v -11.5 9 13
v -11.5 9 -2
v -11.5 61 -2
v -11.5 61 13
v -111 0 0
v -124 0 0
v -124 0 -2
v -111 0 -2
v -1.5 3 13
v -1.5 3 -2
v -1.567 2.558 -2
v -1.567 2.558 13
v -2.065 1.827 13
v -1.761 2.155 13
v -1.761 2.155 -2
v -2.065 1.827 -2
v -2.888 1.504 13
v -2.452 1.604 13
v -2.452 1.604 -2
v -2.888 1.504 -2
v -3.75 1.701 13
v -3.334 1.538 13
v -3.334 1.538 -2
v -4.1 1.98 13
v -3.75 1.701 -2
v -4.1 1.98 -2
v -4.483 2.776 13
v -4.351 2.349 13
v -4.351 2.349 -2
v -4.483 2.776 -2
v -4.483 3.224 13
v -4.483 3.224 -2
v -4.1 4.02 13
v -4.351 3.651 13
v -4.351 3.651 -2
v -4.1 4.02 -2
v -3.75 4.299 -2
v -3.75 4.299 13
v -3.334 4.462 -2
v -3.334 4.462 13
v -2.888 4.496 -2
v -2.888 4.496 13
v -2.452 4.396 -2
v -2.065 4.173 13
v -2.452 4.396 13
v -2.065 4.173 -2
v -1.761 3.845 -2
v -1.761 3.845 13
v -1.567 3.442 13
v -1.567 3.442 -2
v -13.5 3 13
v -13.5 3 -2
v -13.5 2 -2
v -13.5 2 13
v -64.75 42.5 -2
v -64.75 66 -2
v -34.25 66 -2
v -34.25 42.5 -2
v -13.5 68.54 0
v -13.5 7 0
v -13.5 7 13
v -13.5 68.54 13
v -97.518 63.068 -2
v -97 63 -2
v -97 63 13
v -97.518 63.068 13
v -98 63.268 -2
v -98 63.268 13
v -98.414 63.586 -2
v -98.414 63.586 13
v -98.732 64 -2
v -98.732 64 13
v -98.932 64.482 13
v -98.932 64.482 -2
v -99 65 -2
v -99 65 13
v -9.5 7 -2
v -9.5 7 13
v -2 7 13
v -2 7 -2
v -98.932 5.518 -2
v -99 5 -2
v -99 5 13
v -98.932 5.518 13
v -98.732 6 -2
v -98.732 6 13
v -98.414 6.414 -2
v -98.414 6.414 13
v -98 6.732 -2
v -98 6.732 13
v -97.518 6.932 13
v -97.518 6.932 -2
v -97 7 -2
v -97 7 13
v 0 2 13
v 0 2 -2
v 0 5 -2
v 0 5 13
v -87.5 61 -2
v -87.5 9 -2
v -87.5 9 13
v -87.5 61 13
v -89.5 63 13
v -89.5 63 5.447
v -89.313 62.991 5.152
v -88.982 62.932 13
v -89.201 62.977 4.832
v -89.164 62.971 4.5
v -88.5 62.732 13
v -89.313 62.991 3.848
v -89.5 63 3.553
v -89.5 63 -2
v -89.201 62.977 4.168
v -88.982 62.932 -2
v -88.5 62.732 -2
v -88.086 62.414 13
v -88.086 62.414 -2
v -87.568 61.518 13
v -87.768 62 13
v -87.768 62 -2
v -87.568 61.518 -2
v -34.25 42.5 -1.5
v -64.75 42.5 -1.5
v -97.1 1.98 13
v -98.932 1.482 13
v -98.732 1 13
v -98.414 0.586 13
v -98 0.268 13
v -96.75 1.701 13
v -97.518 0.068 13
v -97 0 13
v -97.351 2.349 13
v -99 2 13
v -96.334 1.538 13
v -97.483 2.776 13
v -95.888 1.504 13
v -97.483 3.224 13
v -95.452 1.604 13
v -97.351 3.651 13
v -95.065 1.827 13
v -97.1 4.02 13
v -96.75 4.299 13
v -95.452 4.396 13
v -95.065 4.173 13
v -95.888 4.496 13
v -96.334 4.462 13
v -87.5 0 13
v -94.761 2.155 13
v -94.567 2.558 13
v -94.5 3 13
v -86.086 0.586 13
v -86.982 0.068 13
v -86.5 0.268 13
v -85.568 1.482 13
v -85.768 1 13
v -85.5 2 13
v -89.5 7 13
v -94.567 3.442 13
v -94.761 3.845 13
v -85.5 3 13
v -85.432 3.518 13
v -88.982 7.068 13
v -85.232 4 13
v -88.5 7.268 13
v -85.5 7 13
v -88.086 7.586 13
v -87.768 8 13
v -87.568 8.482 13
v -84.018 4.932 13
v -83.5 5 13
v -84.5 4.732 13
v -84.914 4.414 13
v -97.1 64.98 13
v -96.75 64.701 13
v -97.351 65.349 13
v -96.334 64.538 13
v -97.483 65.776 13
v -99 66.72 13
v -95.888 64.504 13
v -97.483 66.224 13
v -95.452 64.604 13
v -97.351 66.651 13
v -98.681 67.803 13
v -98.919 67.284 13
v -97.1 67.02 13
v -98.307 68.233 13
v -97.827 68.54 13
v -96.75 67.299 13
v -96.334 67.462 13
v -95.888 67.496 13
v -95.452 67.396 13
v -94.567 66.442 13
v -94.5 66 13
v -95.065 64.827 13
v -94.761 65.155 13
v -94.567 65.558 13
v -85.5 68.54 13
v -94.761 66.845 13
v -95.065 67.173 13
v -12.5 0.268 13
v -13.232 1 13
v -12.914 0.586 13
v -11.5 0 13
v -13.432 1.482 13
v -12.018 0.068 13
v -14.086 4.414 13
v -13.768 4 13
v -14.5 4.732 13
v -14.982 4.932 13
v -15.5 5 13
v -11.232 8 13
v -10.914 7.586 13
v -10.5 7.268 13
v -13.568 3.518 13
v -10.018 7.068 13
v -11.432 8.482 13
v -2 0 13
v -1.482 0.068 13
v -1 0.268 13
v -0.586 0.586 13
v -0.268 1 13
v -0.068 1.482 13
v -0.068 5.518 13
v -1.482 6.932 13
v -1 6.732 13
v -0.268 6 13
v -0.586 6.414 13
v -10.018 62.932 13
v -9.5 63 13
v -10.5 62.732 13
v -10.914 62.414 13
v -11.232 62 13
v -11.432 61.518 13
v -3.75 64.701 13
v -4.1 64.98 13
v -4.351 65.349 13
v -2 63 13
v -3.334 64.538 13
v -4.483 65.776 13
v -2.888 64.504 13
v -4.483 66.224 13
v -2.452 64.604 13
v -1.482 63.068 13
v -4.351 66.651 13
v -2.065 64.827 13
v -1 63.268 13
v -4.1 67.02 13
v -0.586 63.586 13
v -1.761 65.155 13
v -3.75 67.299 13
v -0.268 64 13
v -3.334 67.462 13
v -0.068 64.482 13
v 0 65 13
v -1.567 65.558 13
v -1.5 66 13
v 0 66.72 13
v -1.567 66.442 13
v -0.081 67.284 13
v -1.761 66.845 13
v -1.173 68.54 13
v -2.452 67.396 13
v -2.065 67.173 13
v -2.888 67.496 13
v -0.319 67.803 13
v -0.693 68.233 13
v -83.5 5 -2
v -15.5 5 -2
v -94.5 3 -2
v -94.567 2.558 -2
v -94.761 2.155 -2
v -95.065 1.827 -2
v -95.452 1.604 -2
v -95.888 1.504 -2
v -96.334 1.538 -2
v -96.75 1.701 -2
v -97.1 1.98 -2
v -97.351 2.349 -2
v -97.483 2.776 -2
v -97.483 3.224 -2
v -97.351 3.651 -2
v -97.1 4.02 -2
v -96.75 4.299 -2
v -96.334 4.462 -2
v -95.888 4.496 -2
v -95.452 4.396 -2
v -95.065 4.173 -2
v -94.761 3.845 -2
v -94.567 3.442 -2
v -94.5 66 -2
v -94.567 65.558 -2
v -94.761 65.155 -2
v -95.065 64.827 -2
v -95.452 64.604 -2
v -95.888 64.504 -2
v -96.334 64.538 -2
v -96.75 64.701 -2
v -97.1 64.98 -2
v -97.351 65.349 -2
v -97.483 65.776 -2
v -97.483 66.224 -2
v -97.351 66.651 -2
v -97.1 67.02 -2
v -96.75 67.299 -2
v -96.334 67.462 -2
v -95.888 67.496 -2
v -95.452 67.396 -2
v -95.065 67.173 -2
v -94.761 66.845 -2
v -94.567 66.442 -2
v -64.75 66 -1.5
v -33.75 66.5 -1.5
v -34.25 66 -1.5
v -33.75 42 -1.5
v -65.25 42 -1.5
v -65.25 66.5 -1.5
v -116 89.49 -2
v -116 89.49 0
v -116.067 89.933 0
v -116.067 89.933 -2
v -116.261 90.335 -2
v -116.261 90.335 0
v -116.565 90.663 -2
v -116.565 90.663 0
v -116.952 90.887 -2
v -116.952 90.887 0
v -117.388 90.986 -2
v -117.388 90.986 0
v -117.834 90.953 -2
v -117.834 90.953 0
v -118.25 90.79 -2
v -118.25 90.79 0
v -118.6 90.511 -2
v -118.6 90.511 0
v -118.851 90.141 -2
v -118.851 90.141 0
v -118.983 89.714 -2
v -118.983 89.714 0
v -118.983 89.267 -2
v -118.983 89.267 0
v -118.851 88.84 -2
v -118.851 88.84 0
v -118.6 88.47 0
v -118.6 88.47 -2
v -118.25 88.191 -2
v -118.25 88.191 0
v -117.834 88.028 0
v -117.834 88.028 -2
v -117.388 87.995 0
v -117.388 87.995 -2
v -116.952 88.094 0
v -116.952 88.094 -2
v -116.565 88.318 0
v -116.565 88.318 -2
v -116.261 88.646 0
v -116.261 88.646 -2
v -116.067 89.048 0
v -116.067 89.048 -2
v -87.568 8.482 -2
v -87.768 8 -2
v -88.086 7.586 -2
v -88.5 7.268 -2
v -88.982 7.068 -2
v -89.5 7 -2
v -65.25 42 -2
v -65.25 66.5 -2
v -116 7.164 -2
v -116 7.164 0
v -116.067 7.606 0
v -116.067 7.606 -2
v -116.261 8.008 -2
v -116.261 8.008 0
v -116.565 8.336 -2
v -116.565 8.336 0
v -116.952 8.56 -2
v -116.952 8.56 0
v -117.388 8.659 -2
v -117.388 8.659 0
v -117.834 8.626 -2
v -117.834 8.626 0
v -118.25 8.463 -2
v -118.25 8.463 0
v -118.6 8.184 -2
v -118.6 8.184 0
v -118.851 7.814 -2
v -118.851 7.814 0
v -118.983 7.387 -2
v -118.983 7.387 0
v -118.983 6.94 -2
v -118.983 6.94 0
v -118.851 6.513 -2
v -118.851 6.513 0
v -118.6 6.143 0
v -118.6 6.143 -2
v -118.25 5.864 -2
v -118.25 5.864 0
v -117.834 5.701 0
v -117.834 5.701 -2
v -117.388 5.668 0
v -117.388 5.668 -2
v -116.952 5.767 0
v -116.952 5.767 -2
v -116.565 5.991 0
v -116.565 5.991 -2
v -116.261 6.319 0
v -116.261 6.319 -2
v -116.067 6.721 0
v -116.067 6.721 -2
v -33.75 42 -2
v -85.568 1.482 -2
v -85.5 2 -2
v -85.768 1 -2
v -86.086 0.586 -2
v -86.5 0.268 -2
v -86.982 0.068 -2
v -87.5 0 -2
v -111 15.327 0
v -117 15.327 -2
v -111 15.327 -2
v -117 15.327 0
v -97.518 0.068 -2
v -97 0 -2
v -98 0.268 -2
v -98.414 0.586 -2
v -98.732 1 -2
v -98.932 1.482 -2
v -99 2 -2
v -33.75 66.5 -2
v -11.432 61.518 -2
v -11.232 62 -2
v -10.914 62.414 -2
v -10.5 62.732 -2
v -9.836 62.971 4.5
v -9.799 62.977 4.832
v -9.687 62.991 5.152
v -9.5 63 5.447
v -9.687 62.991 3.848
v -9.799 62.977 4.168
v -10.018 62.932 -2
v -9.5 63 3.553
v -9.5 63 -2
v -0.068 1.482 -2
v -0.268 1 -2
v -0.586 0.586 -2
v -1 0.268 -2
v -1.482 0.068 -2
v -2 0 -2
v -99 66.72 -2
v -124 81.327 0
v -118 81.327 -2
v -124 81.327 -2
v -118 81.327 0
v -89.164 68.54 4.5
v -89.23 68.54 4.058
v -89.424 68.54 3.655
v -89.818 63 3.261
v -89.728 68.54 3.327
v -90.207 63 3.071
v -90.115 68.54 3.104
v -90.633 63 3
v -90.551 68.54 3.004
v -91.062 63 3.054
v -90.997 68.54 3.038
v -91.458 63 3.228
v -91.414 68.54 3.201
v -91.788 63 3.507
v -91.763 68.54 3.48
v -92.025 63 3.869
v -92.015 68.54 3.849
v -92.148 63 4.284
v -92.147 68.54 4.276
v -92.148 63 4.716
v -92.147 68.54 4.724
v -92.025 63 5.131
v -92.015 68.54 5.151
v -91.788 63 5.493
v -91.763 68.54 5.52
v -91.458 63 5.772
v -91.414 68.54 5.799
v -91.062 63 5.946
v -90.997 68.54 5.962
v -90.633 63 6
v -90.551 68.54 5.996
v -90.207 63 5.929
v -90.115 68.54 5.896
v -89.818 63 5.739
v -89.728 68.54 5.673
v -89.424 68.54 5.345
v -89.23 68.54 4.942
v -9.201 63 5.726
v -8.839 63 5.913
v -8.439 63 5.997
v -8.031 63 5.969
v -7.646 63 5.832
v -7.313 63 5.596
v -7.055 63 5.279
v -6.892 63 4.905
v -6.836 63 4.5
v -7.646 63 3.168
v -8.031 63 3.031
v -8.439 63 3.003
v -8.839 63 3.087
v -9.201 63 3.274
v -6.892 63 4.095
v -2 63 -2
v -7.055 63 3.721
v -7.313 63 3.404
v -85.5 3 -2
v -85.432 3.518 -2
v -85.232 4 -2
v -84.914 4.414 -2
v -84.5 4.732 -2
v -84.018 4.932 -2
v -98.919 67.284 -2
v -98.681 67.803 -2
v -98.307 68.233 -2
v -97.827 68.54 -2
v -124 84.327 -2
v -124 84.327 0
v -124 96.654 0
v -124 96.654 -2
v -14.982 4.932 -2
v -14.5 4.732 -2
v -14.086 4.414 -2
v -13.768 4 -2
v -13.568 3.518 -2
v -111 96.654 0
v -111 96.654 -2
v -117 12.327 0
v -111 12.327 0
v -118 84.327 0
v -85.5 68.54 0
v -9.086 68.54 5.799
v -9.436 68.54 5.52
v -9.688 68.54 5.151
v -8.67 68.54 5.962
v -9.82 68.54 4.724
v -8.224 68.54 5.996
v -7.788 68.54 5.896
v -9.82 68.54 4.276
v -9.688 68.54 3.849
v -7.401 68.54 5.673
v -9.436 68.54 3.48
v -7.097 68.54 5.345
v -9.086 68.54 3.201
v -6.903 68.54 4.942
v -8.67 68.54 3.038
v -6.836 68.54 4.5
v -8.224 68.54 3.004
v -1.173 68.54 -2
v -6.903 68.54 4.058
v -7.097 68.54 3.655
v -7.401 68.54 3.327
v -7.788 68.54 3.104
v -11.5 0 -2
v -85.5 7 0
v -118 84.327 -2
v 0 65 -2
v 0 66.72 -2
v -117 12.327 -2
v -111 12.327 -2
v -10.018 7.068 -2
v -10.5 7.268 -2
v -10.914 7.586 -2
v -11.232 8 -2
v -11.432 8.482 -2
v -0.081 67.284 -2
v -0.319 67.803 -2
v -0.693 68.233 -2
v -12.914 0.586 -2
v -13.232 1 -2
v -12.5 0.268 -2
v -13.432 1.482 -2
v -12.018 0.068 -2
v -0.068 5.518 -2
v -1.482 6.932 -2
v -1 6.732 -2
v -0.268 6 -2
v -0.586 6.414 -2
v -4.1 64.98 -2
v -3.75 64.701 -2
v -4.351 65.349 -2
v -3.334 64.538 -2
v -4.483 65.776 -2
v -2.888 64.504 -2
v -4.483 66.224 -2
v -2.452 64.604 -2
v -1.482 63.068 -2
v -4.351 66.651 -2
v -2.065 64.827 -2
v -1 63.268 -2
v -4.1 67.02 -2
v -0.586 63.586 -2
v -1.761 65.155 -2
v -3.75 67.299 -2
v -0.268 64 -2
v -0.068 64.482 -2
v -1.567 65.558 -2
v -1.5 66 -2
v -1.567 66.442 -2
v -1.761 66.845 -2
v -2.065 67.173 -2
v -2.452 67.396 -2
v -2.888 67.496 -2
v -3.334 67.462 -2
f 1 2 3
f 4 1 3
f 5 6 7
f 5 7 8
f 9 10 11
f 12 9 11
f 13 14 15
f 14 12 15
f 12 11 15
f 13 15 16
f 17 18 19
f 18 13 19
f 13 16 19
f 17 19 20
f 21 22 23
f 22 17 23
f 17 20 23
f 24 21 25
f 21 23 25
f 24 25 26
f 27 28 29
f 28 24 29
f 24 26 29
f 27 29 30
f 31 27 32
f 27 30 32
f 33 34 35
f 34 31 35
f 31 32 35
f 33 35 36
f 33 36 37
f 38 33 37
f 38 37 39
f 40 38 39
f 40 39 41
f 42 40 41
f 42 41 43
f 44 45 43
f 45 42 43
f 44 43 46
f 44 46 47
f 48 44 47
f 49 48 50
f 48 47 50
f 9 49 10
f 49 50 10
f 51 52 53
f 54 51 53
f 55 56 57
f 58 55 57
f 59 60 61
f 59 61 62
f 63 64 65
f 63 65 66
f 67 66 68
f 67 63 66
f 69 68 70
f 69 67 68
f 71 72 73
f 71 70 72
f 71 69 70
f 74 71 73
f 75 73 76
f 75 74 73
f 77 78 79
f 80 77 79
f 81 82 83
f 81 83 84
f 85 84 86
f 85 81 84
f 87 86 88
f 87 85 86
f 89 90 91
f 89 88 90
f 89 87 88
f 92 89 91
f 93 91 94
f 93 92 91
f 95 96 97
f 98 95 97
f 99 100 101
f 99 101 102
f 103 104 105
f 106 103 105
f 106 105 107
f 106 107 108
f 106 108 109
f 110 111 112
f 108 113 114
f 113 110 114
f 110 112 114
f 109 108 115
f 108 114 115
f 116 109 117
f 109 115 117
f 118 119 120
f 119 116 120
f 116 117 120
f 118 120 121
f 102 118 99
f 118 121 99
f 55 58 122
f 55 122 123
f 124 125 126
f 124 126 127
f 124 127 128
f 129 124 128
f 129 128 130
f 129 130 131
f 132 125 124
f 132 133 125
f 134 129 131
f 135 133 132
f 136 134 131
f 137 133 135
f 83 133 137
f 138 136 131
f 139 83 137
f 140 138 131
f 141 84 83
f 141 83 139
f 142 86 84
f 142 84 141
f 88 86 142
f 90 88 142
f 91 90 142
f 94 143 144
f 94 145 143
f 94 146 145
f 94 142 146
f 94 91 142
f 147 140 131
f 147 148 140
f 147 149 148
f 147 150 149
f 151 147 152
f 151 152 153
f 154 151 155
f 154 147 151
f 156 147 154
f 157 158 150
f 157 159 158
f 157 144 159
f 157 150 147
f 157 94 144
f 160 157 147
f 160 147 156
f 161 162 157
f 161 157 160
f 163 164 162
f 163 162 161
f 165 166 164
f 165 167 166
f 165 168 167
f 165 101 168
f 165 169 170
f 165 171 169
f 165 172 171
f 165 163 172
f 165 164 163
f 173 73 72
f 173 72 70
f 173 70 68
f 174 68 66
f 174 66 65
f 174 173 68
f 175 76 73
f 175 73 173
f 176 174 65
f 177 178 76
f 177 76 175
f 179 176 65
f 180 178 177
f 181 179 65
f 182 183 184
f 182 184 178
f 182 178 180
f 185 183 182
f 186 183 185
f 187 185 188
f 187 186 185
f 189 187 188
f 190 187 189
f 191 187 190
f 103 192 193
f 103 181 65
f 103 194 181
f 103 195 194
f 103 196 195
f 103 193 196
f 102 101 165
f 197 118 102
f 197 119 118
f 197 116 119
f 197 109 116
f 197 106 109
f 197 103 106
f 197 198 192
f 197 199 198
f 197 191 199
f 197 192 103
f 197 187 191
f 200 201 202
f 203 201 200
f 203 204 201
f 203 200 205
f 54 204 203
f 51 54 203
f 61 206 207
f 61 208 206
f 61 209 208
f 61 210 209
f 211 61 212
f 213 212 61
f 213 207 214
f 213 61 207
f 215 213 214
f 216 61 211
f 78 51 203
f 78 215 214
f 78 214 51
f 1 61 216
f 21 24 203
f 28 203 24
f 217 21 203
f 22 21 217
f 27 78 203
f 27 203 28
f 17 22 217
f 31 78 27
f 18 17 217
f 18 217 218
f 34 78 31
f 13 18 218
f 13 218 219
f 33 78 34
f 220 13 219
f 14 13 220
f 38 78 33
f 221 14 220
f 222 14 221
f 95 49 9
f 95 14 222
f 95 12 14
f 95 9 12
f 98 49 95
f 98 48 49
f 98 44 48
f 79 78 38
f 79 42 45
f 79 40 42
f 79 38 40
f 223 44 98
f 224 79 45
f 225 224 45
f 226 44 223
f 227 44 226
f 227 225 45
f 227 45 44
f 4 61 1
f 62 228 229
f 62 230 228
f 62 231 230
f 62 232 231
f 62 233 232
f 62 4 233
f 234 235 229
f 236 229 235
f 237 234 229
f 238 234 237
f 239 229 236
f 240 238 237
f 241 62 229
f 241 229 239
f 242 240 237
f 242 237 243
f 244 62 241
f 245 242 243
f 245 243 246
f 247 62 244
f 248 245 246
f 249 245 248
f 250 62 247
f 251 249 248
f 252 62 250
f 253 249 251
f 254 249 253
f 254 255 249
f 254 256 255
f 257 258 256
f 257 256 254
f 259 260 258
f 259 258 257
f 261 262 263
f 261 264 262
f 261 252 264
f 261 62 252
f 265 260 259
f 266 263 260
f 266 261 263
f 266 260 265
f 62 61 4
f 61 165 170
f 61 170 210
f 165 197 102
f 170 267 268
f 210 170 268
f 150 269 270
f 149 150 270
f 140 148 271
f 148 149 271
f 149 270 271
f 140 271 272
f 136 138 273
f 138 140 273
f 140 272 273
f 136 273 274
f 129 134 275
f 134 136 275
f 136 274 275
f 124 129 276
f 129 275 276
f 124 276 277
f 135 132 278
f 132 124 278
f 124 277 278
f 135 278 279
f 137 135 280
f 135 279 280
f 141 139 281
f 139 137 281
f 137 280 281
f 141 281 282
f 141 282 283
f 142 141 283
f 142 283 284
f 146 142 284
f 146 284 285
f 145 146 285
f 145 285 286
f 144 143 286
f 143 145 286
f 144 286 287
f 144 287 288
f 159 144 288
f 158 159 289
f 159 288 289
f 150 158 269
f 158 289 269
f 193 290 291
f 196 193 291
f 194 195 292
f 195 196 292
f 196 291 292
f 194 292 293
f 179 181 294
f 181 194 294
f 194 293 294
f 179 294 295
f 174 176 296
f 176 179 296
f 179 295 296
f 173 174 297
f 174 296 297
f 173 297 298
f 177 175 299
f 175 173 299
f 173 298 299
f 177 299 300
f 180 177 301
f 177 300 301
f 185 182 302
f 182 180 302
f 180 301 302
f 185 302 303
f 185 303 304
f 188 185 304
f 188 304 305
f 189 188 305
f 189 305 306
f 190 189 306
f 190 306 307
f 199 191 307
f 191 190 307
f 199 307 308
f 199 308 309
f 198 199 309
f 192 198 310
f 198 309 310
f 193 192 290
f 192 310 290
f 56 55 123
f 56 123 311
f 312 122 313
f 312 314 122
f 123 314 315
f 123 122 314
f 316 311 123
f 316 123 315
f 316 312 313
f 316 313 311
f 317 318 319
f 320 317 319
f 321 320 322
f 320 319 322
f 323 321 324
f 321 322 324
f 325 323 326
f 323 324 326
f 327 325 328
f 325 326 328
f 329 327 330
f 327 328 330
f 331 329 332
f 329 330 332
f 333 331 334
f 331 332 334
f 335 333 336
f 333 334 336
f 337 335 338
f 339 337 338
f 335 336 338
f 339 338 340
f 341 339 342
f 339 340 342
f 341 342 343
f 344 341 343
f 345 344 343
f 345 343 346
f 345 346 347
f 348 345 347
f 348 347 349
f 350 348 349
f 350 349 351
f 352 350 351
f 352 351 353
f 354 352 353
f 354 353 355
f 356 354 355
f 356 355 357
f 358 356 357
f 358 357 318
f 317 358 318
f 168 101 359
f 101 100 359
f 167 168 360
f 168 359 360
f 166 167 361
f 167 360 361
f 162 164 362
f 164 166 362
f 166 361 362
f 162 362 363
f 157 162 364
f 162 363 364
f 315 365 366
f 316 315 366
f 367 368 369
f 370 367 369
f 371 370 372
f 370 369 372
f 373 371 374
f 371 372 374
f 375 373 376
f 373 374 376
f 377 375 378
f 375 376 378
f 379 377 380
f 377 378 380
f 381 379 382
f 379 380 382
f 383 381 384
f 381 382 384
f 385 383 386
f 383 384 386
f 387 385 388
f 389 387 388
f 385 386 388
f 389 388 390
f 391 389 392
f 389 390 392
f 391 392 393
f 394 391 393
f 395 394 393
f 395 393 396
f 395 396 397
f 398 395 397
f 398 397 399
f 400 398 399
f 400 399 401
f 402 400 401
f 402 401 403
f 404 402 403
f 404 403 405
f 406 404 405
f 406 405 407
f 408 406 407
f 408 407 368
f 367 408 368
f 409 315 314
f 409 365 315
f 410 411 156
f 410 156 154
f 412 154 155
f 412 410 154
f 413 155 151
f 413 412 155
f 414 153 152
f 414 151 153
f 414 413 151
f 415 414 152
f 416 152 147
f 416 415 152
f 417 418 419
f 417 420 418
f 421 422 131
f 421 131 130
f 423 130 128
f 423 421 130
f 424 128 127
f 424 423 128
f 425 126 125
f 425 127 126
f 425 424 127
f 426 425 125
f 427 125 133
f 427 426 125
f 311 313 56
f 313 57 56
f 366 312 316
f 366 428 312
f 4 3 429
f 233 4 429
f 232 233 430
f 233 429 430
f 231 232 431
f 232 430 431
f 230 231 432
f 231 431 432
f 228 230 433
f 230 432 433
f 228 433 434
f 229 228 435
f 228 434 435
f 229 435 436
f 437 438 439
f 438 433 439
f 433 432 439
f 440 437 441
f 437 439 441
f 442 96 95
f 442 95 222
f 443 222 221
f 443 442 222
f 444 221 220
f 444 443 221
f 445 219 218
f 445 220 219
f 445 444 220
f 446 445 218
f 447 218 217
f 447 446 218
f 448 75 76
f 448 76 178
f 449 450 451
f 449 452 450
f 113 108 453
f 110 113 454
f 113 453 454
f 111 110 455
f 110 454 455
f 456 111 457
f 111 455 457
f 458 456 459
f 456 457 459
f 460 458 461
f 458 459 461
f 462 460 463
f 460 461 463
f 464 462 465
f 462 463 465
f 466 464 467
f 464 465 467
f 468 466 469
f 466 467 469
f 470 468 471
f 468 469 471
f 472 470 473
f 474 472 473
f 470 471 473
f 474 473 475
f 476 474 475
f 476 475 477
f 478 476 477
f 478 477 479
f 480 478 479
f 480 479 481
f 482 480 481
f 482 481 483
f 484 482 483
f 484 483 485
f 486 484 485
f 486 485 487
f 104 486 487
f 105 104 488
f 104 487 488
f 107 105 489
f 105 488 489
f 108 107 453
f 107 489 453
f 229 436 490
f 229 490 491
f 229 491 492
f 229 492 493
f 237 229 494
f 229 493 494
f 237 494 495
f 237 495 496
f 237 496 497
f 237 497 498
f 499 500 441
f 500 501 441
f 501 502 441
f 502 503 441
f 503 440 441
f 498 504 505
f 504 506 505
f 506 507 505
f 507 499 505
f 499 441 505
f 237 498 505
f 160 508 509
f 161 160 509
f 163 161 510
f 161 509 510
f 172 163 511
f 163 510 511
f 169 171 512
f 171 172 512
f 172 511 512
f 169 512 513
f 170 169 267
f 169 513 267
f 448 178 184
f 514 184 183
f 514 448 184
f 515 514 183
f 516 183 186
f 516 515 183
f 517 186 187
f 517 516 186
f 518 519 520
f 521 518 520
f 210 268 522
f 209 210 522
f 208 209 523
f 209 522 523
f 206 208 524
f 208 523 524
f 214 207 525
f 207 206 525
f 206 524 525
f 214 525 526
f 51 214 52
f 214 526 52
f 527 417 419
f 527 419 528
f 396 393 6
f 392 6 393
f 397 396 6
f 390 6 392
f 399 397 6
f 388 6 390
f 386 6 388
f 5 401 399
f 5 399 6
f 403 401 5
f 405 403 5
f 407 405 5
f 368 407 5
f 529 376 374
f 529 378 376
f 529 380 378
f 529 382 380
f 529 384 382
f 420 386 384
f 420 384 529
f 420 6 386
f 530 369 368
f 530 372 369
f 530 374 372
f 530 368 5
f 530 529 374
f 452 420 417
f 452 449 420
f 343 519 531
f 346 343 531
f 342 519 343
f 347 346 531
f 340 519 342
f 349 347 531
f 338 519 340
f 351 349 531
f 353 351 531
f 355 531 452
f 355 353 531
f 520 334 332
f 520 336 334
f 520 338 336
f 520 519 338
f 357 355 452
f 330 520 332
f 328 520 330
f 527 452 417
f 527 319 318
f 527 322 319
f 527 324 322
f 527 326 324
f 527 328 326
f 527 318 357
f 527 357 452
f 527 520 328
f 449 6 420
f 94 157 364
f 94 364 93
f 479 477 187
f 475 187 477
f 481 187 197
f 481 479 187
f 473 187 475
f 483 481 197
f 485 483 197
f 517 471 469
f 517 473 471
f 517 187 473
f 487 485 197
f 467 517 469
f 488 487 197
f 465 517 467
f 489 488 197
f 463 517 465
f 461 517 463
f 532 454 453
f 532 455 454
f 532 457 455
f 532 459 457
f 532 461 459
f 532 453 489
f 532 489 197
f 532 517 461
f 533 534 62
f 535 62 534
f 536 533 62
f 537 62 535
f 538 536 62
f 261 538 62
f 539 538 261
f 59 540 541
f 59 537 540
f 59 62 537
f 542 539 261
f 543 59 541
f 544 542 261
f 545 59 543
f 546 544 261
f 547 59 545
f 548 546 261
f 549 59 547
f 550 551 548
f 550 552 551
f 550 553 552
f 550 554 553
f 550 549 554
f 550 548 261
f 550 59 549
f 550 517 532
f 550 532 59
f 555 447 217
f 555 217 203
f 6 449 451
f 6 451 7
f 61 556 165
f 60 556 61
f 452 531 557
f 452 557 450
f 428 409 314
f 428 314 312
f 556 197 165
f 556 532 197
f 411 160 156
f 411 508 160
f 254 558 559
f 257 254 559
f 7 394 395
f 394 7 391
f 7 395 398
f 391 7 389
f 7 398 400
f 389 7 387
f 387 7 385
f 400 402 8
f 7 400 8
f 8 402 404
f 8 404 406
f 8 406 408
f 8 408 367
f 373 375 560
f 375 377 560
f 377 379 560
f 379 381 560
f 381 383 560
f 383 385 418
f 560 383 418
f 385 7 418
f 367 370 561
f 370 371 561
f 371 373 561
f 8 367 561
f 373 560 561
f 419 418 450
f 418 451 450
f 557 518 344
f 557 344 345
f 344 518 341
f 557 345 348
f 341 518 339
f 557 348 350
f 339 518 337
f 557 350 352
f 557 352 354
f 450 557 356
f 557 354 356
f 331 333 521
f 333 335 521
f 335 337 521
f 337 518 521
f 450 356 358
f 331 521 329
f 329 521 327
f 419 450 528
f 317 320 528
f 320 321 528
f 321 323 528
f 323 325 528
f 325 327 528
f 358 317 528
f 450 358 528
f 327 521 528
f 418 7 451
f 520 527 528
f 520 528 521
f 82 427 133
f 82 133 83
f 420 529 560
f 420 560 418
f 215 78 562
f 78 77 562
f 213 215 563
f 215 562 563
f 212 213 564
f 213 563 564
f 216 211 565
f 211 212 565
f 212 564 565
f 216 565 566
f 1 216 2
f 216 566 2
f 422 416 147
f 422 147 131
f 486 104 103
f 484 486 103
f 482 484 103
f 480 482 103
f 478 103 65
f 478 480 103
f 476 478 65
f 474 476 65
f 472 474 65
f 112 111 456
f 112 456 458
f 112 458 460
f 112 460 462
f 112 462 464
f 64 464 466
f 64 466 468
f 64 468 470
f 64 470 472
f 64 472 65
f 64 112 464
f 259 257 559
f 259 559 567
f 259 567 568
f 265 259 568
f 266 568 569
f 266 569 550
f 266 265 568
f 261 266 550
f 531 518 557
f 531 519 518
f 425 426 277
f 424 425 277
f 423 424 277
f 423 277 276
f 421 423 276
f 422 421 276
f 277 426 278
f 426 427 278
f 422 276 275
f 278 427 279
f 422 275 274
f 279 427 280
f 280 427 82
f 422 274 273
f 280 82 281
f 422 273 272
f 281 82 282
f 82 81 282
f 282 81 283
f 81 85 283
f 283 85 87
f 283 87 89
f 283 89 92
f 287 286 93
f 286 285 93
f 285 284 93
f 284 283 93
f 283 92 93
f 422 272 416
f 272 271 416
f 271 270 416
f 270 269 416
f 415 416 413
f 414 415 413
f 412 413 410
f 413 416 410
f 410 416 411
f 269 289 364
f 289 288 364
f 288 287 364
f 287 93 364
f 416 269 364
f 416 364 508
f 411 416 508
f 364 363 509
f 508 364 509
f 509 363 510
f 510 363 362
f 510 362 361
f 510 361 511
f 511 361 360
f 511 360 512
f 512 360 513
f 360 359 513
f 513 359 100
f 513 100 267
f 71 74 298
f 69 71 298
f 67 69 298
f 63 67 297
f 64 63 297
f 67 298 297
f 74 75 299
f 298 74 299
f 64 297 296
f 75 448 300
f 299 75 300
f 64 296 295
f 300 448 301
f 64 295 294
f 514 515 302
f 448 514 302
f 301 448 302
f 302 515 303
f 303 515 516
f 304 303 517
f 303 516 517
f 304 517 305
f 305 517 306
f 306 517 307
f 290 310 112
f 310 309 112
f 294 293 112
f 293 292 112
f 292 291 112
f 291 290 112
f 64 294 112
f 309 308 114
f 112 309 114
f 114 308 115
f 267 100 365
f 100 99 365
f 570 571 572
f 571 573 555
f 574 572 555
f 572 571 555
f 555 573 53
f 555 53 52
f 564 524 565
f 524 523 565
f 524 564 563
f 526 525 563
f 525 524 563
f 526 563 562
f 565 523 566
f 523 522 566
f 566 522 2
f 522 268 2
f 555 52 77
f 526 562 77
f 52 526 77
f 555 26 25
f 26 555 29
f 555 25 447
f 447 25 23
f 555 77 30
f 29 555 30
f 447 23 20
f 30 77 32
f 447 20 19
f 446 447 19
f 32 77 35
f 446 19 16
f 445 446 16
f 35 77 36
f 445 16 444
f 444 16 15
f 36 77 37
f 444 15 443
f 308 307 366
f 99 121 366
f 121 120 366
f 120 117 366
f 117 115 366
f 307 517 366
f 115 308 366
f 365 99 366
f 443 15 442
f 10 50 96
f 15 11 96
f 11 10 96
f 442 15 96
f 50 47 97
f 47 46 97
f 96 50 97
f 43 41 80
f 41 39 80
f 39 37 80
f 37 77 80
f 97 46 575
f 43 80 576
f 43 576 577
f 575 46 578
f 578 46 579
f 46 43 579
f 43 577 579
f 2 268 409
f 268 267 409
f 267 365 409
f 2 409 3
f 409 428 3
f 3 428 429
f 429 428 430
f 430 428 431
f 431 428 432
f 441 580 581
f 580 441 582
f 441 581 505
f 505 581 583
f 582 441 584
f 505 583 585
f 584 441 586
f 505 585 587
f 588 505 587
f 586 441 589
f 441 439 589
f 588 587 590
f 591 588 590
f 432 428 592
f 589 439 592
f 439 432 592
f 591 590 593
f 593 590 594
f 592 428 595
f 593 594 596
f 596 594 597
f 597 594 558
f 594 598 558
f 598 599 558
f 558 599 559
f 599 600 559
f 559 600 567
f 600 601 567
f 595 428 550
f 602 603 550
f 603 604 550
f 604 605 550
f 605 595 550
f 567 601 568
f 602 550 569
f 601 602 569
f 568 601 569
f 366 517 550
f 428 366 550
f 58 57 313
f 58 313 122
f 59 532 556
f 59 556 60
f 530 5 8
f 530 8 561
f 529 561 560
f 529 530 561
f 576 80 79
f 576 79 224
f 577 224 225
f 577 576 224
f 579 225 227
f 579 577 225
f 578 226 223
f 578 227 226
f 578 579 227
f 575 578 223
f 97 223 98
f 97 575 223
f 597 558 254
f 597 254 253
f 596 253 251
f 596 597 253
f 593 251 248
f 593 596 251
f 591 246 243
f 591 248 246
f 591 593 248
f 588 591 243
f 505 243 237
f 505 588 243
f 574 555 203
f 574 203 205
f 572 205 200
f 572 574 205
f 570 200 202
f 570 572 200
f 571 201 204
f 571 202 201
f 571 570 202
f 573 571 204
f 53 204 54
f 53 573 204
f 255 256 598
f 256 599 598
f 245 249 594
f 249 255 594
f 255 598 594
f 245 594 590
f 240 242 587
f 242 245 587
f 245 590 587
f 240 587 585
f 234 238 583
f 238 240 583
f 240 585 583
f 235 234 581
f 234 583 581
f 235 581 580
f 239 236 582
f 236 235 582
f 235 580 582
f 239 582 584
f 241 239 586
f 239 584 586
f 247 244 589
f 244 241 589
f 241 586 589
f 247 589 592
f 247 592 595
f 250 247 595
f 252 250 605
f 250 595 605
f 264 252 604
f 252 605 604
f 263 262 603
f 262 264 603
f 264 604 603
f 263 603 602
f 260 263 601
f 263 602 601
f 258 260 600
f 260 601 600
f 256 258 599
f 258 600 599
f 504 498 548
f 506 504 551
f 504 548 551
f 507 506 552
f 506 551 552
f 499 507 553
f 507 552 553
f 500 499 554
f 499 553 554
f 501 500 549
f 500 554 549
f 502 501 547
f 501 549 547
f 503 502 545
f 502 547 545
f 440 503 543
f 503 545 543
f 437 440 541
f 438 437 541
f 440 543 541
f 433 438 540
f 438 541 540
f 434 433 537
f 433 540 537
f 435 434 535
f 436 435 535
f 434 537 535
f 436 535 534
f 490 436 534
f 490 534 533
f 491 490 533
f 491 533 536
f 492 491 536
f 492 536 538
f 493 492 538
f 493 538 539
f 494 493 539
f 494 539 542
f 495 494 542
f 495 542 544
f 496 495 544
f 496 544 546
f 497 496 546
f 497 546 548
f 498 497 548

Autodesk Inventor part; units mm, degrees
ref_plane "YZ Plane" through (0, 0, 0) normal (1, 0, 0) x (0, 1, 0)
ref_plane "XZ Plane" through (0, 0, 0) normal (0, 1, 0) x (-1, 0, 0)
ref_plane "XY Plane" through (0, 0, 0) normal (0, 0, 1) x (1, 0, 0)
sketch "Sketch1" plane through (0, 0, 0) normal (0, 0, 1) x (1, 0, 0)
  arc A0 (-97.827, 68.5405) -> (-99, 66.7195) centre (-97, 66.7195) ccw
  arc A1 (0, 66.7195) -> (-1.173, 68.5405) centre (-2, 66.7195) ccw
  arc A2 (-99, 2) -> (-97, 0) centre (-97, 2) ccw
  arc A3 (-2, 0) -> (0, 2) centre (-2, 2) ccw
  circle A4 centre (-3, 3) radius 1.5
  circle A5 centre (-96, 3) radius 1.5
  circle A6 centre (-3, 66) radius 1.5
  circle A7 centre (-96, 66) radius 1.5
  line L0 (-97.827, 68.5405) -> (-1.173, 68.5405)
  line L1 (-64.75, 66) -> (-34.25, 66)
  line L2 (-64.75, 66) -> (-64.75, 42.5)
  line L3 (-64.75, 42.5) -> (-34.25, 42.5)
  line L4 (-34.25, 42.5) -> (-34.25, 66)
  line L5 (-83.5, 5) -> (-15.5, 5)
  line L6 (-11.5, 9) -> (-11.5, 61)
  line L7 (-87.5, 9) -> (-87.5, 61)
  line L8 (-89.5, 63) -> (-97, 63)
  line L9 (-89.5, 7) -> (-97, 7)
  line L10 (-85.5, 3) -> (-85.5, 2)
  line L11 (-11.5, 9) -> (-11.5, 61)
  line L12 (-9.5, 63) -> (-2, 63)
  line L13 (-9.5, 7) -> (-2, 7)
  line L14 (-13.5, 3) -> (-13.5, 2)
  line L15 (-99, 2) -> (-99, 5)
  line L16 (-99, 65) -> (-99, 66.7195)
  line L17 (0, 2) -> (0, 5)
  line L18 (0, 65) -> (0, 66.7195)
  line L19 (-2, 0) -> (-11.5, 0)
  line L20 (-87.5, 0) -> (-97, 0)
  arc A8 (-87.5, 61) -> (-89.5, 63) centre (-89.5, 61) ccw
  arc A9 (-9.5, 63) -> (-11.5, 61) centre (-9.5, 61) ccw
  arc A10 (-11.5, 9) -> (-9.5, 7) centre (-9.5, 9) ccw
  arc A11 (-13.5, 3) -> (-15.5, 5) centre (-15.5, 3) ccw
  arc A12 (-83.5, 5) -> (-85.5, 3) centre (-83.5, 3) ccw
  arc A13 (-89.5, 7) -> (-87.5, 9) centre (-89.5, 9) ccw
  arc A14 (-2, 63) -> (0, 65) centre (-2, 65) ccw
  arc A15 (-99, 65) -> (-97, 63) centre (-97, 65) ccw
  arc A16 (-97, 7) -> (-99, 5) centre (-97, 5) ccw
  arc A17 (-87.5, 0) -> (-85.5, 2) centre (-87.5, 2) ccw
  arc A18 (-13.5, 2) -> (-11.5, 0) centre (-11.5, 2) ccw
  arc A19 (0, 5) -> (-2, 7) centre (-2, 5) ccw
  point P0 (0, 0)
  point P1 (-99, 68)
  point P2 (-97, 2)
  point P3 (-85.5, 5)
  point P4 (-87.5, 63)
  point P5 (-99, 63)
  point P6 (-99, 7)
  point P7 (-85.5, 0)
  point P8 (-87.5, 7)
  point P9 (0, 63)
  point P10 (0, 7)
  point P11 (-13.5, 0)
  point P12 (-13.5, 5)
  dimension "d5" = 2
  dimension "d6" = 2
  dimension "d7" = 2
  dimension "d8" = 2
  dimension "d14" = 3
  dimension "d16" = 3
  dimension "d94" = 3
  dimension "d95" = 3
  dimension "d97" = 99
  dimension "d98" = 30.5
  dimension "d99" = 23.5
  dimension "d190" = 96.654
  dimension "d200" = 10.327
  dimension "d228" = 2
  dimension "d229" = 2
  dimension "d230" = 2
extrude "Extrusion1" add sketch "Sketch1" against normal blind 2 contours L0 A1 L18 A14 L12 A9 L6 A10 L13 A19 L17 A3 L19 A18 L14 A11 L5 A12 L10 A17 L20 A2 L15 A16 L9 A13 L7 A8 L8 A15 L16 A0 | L1 L4 L3 L2
sketch "Sketch2" plane through (0, 0, 0) normal (0, 0, 1) x (1, 0, 0)
  arc A0 (-97.827, 68.5405) -> (-99, 66.7195) centre (-97, 66.7195) ccw
  arc A1 (0, 66.7195) -> (-1.173, 68.5405) centre (-2, 66.7195) ccw
  arc A2 (-99, 2) -> (-97, 0) centre (-97, 2) ccw
  arc A3 (-2, 0) -> (0, 2) centre (-2, 2) ccw
  circle A4 centre (-3, 3) radius 1.5
  circle A5 centre (-96, 3) radius 1.5
  circle A6 centre (-3, 66) radius 1.5
  circle A7 centre (-96, 66) radius 1.5
  line L0 (-97.827, 68.5405) -> (-1.173, 68.5405)
  line L1 (-64.75, 66) -> (-34.25, 66)
  line L2 (-64.75, 66) -> (-64.75, 42.5)
  line L3 (-64.75, 42.5) -> (-34.25, 42.5)
  line L4 (-34.25, 42.5) -> (-34.25, 66)
  line L5 (-83.5, 5) -> (-15.5, 5)
  line L6 (-11.5, 9) -> (-11.5, 61)
  line L7 (-87.5, 9) -> (-87.5, 61)
  line L8 (-89.5, 63) -> (-97, 63)
  line L9 (-89.5, 7) -> (-97, 7)
  line L10 (-85.5, 3) -> (-85.5, 2)
  line L11 (-13.5, 3) -> (-13.5, 2)
  line L12 (-11.5, 9) -> (-11.5, 61)
  line L13 (-9.5, 7) -> (-2, 7)
  line L14 (-9.5, 63) -> (-2, 63)
  line L15 (-99, 2) -> (-99, 5)
  line L16 (-99, 65) -> (-99, 66.7195)
  line L17 (0, 2) -> (0, 5)
  line L18 (0, 65) -> (0, 66.7195)
  line L19 (-2, 0) -> (-11.5, 0)
  line L20 (-87.5, 0) -> (-97, 0)
  arc A8 (-87.5, 61) -> (-89.5, 63) centre (-89.5, 61) ccw
  arc A9 (-9.5, 63) -> (-11.5, 61) centre (-9.5, 61) ccw
  arc A10 (-11.5, 9) -> (-9.5, 7) centre (-9.5, 9) ccw
  arc A11 (-13.5, 3) -> (-15.5, 5) centre (-15.5, 3) ccw
  arc A12 (-83.5, 5) -> (-85.5, 3) centre (-83.5, 3) ccw
  arc A13 (-89.5, 7) -> (-87.5, 9) centre (-89.5, 9) ccw
  arc A14 (-2, 63) -> (0, 65) centre (-2, 65) ccw
  arc A15 (-99, 65) -> (-97, 63) centre (-97, 65) ccw
  arc A16 (-97, 7) -> (-99, 5) centre (-97, 5) ccw
  arc A17 (-87.5, 0) -> (-85.5, 2) centre (-87.5, 2) ccw
  arc A18 (-13.5, 2) -> (-11.5, 0) centre (-11.5, 2) ccw
  arc A19 (0, 5) -> (-2, 7) centre (-2, 5) ccw
  line L21 (-85.5, 68.5405) -> (-85.5, 7)
  line L22 (-85.5, 7) -> (-13.5, 7)
  line L23 (-13.5, 7) -> (-13.5, 68.5405)
  point P0 (0, 0)
  point P1 (-99, 68)
  point P2 (-97, 2)
  point P3 (-85.5, 5)
  point P4 (-87.5, 63)
  point P5 (-99, 63)
  point P6 (-99, 7)
  point P7 (-85.5, 0)
  point P8 (-87.5, 7)
  point P9 (-13.5, 0)
  point P10 (0, 7)
  point P11 (0, 63)
  point P12 (-13.5, 5)
  point P13 (-89.5, 7)
  dimension "d231" = 2
  dimension "d232" = 2
  dimension "d233" = 2
  dimension "d234" = 2
  dimension "d235" = 3
  dimension "d236" = 3
  dimension "d237" = 3
  dimension "d238" = 3
  dimension "d239" = 99
  dimension "d240" = 30.5
  dimension "d241" = 23.5
  dimension "d242" = 96.654
  dimension "d243" = 10.327
  dimension "d244" = 2
  dimension "d245" = 2
  dimension "d246" = 2
extrude "Extrusion2" add sketch "Sketch2" along normal blind 13 contours L0 L21 L22 L23 A1 L18 A14 L14 A9 L6 A10 L13 A19 L17 A3 L19 A18 L11 A11 L5 A12 L10 A17 L20 A2 L15 A16 L9 A13 L7 A8 L8 A15 L16 A0
sketch "Sketch3" plane through (0, 0, 0) normal (0, 0, 1) x (1, 0, 0)
  line L0 (-117, 15.327) -> (-111, 15.327)
  line L1 (-117, 12.327) -> (-117, 15.327)
  line L2 (-111, 12.327) -> (-117, 12.327)
  line L3 (-118, 81.327) -> (-124, 81.327)
  line L4 (-124, 84.327) -> (-118, 84.327)
  line L5 (-118, 84.327) -> (-118, 81.327)
  line L6 (-118, 81.327) -> (-124, 81.327)
  line L7 (-111, 0) -> (-111, 12.327)
  line L8 (-111, 15.327) -> (-111, 96.654)
  line L9 (-124, 84.327) -> (-124, 96.654)
  line L10 (-124, 81.327) -> (-124, 0)
  line L11 (-111, 96.654) -> (-124, 96.654)
  line L12 (-124, 0) -> (-111, 0)
  point P0 (0, 0)
  point P1 (-111, 0)
  dimension "d194" = 6
  dimension "d195" = 3
  dimension "d201" = 12.327
  dimension "d227" = 13
sketch "Sketch4" plane through (0, 0, -2) normal (0, 0, -1) x (-1, 0, 0)
  arc A0 (1.173, 68.5405) -> (0, 66.7195) centre (2, 66.7195) ccw
  arc A1 (99, 66.7195) -> (97.827, 68.5405) centre (97, 66.7195) ccw
  arc A2 (0, 2) -> (2, 0) centre (2, 2) ccw
  arc A3 (97, 0) -> (99, 2) centre (97, 2) ccw
  circle A4 centre (96, 3) radius 1.5
  circle A5 centre (3, 3) radius 1.5
  circle A6 centre (96, 66) radius 1.5
  circle A7 centre (3, 66) radius 1.5
  line L0 (1.173, 68.5405) -> (97.827, 68.5405)
  line L1 (34.25, 66) -> (64.75, 66)
  line L2 (34.25, 66) -> (34.25, 42.5)
  line L3 (34.25, 42.5) -> (64.75, 42.5)
  line L4 (64.75, 42.5) -> (64.75, 66)
  line L5 (13.5, 5) -> (85.5, 5)
  line L6 (87.5, 7) -> (87.5, 63)
  line L7 (11.5, 7) -> (11.5, 63)
  line L8 (11.5, 63) -> (0, 63)
  line L9 (11.5, 7) -> (0, 7)
  line L10 (13.5, 5) -> (13.5, 0)
  line L11 (85.5, 5) -> (85.5, 0)
  line L12 (87.5, 7) -> (87.5, 63)
  line L13 (87.5, 7) -> (99, 7)
  line L14 (87.5, 63) -> (99, 63)
  line L15 (0, 2) -> (0, 7)
  line L16 (0, 63) -> (0, 66.7195)
  line L17 (99, 2) -> (99, 7)
  line L18 (99, 63) -> (99, 66.7195)
  line L19 (97, 0) -> (85.5, 0)
  line L20 (13.5, 0) -> (2, 0)
  line L21 (65.25, 42) -> (33.75, 42)
  line L22 (33.75, 42) -> (33.75, 66.5)
  line L23 (33.75, 66.5) -> (65.25, 66.5)
  line L24 (65.25, 42) -> (65.25, 66.5)
  point P0 (0, 0)
  point P1 (99, 0)
  point P2 (0, 68)
  point P3 (2, 2)
  dimension "d140" = 2
  dimension "d141" = 2
  dimension "d143" = 2
  dimension "d144" = 3
  dimension "d145" = 3
  dimension "d146" = 3
  dimension "d147" = 3
  dimension "d148" = 99
  dimension "d149" = 30.5
  dimension "d150" = 23.5
  dimension "d151" = 0.5
extrude "Extrusion4" cut sketch "Sketch4" against normal blind 0.5 contours L21 L22 L23 L24
extrude "Extrusion3" add sketch "Sketch3" against normal blind 2
sketch "Sketch5" plane through (-97.827, 68.5405, -2) normal (0, 1, 0) x (1, 0, 0)
  circle A0 centre (89.4905, -6.5) radius 1.5
  circle A1 centre (7.1635, -6.5) radius 1.5
  point P0 (97.827, -2)
extrude "Extrusion5" cut sketch "Sketch5" against normal blind 6
sketch "Sketch6" plane through (0, 0, 0) normal (0, 0, 1) x (1, 0, 0)
  line L0 (-117.5, 87.327) -> (-117.5, 87.327)
  circle A0 centre (-117.5, 89.4905) radius 1.5
  circle A1 centre (-117.5, 7.1635) radius 1.5
  point P0 (0, 0)
  point P1 (-116.5, 87.327)
  point P2 (-118.5, 87.327)
  dimension "d222" = 2
extrude "Extrusion6" cut sketch "Sketch6" against normal blind 2
properties part number "Caixa_baterias_em_baixo"
